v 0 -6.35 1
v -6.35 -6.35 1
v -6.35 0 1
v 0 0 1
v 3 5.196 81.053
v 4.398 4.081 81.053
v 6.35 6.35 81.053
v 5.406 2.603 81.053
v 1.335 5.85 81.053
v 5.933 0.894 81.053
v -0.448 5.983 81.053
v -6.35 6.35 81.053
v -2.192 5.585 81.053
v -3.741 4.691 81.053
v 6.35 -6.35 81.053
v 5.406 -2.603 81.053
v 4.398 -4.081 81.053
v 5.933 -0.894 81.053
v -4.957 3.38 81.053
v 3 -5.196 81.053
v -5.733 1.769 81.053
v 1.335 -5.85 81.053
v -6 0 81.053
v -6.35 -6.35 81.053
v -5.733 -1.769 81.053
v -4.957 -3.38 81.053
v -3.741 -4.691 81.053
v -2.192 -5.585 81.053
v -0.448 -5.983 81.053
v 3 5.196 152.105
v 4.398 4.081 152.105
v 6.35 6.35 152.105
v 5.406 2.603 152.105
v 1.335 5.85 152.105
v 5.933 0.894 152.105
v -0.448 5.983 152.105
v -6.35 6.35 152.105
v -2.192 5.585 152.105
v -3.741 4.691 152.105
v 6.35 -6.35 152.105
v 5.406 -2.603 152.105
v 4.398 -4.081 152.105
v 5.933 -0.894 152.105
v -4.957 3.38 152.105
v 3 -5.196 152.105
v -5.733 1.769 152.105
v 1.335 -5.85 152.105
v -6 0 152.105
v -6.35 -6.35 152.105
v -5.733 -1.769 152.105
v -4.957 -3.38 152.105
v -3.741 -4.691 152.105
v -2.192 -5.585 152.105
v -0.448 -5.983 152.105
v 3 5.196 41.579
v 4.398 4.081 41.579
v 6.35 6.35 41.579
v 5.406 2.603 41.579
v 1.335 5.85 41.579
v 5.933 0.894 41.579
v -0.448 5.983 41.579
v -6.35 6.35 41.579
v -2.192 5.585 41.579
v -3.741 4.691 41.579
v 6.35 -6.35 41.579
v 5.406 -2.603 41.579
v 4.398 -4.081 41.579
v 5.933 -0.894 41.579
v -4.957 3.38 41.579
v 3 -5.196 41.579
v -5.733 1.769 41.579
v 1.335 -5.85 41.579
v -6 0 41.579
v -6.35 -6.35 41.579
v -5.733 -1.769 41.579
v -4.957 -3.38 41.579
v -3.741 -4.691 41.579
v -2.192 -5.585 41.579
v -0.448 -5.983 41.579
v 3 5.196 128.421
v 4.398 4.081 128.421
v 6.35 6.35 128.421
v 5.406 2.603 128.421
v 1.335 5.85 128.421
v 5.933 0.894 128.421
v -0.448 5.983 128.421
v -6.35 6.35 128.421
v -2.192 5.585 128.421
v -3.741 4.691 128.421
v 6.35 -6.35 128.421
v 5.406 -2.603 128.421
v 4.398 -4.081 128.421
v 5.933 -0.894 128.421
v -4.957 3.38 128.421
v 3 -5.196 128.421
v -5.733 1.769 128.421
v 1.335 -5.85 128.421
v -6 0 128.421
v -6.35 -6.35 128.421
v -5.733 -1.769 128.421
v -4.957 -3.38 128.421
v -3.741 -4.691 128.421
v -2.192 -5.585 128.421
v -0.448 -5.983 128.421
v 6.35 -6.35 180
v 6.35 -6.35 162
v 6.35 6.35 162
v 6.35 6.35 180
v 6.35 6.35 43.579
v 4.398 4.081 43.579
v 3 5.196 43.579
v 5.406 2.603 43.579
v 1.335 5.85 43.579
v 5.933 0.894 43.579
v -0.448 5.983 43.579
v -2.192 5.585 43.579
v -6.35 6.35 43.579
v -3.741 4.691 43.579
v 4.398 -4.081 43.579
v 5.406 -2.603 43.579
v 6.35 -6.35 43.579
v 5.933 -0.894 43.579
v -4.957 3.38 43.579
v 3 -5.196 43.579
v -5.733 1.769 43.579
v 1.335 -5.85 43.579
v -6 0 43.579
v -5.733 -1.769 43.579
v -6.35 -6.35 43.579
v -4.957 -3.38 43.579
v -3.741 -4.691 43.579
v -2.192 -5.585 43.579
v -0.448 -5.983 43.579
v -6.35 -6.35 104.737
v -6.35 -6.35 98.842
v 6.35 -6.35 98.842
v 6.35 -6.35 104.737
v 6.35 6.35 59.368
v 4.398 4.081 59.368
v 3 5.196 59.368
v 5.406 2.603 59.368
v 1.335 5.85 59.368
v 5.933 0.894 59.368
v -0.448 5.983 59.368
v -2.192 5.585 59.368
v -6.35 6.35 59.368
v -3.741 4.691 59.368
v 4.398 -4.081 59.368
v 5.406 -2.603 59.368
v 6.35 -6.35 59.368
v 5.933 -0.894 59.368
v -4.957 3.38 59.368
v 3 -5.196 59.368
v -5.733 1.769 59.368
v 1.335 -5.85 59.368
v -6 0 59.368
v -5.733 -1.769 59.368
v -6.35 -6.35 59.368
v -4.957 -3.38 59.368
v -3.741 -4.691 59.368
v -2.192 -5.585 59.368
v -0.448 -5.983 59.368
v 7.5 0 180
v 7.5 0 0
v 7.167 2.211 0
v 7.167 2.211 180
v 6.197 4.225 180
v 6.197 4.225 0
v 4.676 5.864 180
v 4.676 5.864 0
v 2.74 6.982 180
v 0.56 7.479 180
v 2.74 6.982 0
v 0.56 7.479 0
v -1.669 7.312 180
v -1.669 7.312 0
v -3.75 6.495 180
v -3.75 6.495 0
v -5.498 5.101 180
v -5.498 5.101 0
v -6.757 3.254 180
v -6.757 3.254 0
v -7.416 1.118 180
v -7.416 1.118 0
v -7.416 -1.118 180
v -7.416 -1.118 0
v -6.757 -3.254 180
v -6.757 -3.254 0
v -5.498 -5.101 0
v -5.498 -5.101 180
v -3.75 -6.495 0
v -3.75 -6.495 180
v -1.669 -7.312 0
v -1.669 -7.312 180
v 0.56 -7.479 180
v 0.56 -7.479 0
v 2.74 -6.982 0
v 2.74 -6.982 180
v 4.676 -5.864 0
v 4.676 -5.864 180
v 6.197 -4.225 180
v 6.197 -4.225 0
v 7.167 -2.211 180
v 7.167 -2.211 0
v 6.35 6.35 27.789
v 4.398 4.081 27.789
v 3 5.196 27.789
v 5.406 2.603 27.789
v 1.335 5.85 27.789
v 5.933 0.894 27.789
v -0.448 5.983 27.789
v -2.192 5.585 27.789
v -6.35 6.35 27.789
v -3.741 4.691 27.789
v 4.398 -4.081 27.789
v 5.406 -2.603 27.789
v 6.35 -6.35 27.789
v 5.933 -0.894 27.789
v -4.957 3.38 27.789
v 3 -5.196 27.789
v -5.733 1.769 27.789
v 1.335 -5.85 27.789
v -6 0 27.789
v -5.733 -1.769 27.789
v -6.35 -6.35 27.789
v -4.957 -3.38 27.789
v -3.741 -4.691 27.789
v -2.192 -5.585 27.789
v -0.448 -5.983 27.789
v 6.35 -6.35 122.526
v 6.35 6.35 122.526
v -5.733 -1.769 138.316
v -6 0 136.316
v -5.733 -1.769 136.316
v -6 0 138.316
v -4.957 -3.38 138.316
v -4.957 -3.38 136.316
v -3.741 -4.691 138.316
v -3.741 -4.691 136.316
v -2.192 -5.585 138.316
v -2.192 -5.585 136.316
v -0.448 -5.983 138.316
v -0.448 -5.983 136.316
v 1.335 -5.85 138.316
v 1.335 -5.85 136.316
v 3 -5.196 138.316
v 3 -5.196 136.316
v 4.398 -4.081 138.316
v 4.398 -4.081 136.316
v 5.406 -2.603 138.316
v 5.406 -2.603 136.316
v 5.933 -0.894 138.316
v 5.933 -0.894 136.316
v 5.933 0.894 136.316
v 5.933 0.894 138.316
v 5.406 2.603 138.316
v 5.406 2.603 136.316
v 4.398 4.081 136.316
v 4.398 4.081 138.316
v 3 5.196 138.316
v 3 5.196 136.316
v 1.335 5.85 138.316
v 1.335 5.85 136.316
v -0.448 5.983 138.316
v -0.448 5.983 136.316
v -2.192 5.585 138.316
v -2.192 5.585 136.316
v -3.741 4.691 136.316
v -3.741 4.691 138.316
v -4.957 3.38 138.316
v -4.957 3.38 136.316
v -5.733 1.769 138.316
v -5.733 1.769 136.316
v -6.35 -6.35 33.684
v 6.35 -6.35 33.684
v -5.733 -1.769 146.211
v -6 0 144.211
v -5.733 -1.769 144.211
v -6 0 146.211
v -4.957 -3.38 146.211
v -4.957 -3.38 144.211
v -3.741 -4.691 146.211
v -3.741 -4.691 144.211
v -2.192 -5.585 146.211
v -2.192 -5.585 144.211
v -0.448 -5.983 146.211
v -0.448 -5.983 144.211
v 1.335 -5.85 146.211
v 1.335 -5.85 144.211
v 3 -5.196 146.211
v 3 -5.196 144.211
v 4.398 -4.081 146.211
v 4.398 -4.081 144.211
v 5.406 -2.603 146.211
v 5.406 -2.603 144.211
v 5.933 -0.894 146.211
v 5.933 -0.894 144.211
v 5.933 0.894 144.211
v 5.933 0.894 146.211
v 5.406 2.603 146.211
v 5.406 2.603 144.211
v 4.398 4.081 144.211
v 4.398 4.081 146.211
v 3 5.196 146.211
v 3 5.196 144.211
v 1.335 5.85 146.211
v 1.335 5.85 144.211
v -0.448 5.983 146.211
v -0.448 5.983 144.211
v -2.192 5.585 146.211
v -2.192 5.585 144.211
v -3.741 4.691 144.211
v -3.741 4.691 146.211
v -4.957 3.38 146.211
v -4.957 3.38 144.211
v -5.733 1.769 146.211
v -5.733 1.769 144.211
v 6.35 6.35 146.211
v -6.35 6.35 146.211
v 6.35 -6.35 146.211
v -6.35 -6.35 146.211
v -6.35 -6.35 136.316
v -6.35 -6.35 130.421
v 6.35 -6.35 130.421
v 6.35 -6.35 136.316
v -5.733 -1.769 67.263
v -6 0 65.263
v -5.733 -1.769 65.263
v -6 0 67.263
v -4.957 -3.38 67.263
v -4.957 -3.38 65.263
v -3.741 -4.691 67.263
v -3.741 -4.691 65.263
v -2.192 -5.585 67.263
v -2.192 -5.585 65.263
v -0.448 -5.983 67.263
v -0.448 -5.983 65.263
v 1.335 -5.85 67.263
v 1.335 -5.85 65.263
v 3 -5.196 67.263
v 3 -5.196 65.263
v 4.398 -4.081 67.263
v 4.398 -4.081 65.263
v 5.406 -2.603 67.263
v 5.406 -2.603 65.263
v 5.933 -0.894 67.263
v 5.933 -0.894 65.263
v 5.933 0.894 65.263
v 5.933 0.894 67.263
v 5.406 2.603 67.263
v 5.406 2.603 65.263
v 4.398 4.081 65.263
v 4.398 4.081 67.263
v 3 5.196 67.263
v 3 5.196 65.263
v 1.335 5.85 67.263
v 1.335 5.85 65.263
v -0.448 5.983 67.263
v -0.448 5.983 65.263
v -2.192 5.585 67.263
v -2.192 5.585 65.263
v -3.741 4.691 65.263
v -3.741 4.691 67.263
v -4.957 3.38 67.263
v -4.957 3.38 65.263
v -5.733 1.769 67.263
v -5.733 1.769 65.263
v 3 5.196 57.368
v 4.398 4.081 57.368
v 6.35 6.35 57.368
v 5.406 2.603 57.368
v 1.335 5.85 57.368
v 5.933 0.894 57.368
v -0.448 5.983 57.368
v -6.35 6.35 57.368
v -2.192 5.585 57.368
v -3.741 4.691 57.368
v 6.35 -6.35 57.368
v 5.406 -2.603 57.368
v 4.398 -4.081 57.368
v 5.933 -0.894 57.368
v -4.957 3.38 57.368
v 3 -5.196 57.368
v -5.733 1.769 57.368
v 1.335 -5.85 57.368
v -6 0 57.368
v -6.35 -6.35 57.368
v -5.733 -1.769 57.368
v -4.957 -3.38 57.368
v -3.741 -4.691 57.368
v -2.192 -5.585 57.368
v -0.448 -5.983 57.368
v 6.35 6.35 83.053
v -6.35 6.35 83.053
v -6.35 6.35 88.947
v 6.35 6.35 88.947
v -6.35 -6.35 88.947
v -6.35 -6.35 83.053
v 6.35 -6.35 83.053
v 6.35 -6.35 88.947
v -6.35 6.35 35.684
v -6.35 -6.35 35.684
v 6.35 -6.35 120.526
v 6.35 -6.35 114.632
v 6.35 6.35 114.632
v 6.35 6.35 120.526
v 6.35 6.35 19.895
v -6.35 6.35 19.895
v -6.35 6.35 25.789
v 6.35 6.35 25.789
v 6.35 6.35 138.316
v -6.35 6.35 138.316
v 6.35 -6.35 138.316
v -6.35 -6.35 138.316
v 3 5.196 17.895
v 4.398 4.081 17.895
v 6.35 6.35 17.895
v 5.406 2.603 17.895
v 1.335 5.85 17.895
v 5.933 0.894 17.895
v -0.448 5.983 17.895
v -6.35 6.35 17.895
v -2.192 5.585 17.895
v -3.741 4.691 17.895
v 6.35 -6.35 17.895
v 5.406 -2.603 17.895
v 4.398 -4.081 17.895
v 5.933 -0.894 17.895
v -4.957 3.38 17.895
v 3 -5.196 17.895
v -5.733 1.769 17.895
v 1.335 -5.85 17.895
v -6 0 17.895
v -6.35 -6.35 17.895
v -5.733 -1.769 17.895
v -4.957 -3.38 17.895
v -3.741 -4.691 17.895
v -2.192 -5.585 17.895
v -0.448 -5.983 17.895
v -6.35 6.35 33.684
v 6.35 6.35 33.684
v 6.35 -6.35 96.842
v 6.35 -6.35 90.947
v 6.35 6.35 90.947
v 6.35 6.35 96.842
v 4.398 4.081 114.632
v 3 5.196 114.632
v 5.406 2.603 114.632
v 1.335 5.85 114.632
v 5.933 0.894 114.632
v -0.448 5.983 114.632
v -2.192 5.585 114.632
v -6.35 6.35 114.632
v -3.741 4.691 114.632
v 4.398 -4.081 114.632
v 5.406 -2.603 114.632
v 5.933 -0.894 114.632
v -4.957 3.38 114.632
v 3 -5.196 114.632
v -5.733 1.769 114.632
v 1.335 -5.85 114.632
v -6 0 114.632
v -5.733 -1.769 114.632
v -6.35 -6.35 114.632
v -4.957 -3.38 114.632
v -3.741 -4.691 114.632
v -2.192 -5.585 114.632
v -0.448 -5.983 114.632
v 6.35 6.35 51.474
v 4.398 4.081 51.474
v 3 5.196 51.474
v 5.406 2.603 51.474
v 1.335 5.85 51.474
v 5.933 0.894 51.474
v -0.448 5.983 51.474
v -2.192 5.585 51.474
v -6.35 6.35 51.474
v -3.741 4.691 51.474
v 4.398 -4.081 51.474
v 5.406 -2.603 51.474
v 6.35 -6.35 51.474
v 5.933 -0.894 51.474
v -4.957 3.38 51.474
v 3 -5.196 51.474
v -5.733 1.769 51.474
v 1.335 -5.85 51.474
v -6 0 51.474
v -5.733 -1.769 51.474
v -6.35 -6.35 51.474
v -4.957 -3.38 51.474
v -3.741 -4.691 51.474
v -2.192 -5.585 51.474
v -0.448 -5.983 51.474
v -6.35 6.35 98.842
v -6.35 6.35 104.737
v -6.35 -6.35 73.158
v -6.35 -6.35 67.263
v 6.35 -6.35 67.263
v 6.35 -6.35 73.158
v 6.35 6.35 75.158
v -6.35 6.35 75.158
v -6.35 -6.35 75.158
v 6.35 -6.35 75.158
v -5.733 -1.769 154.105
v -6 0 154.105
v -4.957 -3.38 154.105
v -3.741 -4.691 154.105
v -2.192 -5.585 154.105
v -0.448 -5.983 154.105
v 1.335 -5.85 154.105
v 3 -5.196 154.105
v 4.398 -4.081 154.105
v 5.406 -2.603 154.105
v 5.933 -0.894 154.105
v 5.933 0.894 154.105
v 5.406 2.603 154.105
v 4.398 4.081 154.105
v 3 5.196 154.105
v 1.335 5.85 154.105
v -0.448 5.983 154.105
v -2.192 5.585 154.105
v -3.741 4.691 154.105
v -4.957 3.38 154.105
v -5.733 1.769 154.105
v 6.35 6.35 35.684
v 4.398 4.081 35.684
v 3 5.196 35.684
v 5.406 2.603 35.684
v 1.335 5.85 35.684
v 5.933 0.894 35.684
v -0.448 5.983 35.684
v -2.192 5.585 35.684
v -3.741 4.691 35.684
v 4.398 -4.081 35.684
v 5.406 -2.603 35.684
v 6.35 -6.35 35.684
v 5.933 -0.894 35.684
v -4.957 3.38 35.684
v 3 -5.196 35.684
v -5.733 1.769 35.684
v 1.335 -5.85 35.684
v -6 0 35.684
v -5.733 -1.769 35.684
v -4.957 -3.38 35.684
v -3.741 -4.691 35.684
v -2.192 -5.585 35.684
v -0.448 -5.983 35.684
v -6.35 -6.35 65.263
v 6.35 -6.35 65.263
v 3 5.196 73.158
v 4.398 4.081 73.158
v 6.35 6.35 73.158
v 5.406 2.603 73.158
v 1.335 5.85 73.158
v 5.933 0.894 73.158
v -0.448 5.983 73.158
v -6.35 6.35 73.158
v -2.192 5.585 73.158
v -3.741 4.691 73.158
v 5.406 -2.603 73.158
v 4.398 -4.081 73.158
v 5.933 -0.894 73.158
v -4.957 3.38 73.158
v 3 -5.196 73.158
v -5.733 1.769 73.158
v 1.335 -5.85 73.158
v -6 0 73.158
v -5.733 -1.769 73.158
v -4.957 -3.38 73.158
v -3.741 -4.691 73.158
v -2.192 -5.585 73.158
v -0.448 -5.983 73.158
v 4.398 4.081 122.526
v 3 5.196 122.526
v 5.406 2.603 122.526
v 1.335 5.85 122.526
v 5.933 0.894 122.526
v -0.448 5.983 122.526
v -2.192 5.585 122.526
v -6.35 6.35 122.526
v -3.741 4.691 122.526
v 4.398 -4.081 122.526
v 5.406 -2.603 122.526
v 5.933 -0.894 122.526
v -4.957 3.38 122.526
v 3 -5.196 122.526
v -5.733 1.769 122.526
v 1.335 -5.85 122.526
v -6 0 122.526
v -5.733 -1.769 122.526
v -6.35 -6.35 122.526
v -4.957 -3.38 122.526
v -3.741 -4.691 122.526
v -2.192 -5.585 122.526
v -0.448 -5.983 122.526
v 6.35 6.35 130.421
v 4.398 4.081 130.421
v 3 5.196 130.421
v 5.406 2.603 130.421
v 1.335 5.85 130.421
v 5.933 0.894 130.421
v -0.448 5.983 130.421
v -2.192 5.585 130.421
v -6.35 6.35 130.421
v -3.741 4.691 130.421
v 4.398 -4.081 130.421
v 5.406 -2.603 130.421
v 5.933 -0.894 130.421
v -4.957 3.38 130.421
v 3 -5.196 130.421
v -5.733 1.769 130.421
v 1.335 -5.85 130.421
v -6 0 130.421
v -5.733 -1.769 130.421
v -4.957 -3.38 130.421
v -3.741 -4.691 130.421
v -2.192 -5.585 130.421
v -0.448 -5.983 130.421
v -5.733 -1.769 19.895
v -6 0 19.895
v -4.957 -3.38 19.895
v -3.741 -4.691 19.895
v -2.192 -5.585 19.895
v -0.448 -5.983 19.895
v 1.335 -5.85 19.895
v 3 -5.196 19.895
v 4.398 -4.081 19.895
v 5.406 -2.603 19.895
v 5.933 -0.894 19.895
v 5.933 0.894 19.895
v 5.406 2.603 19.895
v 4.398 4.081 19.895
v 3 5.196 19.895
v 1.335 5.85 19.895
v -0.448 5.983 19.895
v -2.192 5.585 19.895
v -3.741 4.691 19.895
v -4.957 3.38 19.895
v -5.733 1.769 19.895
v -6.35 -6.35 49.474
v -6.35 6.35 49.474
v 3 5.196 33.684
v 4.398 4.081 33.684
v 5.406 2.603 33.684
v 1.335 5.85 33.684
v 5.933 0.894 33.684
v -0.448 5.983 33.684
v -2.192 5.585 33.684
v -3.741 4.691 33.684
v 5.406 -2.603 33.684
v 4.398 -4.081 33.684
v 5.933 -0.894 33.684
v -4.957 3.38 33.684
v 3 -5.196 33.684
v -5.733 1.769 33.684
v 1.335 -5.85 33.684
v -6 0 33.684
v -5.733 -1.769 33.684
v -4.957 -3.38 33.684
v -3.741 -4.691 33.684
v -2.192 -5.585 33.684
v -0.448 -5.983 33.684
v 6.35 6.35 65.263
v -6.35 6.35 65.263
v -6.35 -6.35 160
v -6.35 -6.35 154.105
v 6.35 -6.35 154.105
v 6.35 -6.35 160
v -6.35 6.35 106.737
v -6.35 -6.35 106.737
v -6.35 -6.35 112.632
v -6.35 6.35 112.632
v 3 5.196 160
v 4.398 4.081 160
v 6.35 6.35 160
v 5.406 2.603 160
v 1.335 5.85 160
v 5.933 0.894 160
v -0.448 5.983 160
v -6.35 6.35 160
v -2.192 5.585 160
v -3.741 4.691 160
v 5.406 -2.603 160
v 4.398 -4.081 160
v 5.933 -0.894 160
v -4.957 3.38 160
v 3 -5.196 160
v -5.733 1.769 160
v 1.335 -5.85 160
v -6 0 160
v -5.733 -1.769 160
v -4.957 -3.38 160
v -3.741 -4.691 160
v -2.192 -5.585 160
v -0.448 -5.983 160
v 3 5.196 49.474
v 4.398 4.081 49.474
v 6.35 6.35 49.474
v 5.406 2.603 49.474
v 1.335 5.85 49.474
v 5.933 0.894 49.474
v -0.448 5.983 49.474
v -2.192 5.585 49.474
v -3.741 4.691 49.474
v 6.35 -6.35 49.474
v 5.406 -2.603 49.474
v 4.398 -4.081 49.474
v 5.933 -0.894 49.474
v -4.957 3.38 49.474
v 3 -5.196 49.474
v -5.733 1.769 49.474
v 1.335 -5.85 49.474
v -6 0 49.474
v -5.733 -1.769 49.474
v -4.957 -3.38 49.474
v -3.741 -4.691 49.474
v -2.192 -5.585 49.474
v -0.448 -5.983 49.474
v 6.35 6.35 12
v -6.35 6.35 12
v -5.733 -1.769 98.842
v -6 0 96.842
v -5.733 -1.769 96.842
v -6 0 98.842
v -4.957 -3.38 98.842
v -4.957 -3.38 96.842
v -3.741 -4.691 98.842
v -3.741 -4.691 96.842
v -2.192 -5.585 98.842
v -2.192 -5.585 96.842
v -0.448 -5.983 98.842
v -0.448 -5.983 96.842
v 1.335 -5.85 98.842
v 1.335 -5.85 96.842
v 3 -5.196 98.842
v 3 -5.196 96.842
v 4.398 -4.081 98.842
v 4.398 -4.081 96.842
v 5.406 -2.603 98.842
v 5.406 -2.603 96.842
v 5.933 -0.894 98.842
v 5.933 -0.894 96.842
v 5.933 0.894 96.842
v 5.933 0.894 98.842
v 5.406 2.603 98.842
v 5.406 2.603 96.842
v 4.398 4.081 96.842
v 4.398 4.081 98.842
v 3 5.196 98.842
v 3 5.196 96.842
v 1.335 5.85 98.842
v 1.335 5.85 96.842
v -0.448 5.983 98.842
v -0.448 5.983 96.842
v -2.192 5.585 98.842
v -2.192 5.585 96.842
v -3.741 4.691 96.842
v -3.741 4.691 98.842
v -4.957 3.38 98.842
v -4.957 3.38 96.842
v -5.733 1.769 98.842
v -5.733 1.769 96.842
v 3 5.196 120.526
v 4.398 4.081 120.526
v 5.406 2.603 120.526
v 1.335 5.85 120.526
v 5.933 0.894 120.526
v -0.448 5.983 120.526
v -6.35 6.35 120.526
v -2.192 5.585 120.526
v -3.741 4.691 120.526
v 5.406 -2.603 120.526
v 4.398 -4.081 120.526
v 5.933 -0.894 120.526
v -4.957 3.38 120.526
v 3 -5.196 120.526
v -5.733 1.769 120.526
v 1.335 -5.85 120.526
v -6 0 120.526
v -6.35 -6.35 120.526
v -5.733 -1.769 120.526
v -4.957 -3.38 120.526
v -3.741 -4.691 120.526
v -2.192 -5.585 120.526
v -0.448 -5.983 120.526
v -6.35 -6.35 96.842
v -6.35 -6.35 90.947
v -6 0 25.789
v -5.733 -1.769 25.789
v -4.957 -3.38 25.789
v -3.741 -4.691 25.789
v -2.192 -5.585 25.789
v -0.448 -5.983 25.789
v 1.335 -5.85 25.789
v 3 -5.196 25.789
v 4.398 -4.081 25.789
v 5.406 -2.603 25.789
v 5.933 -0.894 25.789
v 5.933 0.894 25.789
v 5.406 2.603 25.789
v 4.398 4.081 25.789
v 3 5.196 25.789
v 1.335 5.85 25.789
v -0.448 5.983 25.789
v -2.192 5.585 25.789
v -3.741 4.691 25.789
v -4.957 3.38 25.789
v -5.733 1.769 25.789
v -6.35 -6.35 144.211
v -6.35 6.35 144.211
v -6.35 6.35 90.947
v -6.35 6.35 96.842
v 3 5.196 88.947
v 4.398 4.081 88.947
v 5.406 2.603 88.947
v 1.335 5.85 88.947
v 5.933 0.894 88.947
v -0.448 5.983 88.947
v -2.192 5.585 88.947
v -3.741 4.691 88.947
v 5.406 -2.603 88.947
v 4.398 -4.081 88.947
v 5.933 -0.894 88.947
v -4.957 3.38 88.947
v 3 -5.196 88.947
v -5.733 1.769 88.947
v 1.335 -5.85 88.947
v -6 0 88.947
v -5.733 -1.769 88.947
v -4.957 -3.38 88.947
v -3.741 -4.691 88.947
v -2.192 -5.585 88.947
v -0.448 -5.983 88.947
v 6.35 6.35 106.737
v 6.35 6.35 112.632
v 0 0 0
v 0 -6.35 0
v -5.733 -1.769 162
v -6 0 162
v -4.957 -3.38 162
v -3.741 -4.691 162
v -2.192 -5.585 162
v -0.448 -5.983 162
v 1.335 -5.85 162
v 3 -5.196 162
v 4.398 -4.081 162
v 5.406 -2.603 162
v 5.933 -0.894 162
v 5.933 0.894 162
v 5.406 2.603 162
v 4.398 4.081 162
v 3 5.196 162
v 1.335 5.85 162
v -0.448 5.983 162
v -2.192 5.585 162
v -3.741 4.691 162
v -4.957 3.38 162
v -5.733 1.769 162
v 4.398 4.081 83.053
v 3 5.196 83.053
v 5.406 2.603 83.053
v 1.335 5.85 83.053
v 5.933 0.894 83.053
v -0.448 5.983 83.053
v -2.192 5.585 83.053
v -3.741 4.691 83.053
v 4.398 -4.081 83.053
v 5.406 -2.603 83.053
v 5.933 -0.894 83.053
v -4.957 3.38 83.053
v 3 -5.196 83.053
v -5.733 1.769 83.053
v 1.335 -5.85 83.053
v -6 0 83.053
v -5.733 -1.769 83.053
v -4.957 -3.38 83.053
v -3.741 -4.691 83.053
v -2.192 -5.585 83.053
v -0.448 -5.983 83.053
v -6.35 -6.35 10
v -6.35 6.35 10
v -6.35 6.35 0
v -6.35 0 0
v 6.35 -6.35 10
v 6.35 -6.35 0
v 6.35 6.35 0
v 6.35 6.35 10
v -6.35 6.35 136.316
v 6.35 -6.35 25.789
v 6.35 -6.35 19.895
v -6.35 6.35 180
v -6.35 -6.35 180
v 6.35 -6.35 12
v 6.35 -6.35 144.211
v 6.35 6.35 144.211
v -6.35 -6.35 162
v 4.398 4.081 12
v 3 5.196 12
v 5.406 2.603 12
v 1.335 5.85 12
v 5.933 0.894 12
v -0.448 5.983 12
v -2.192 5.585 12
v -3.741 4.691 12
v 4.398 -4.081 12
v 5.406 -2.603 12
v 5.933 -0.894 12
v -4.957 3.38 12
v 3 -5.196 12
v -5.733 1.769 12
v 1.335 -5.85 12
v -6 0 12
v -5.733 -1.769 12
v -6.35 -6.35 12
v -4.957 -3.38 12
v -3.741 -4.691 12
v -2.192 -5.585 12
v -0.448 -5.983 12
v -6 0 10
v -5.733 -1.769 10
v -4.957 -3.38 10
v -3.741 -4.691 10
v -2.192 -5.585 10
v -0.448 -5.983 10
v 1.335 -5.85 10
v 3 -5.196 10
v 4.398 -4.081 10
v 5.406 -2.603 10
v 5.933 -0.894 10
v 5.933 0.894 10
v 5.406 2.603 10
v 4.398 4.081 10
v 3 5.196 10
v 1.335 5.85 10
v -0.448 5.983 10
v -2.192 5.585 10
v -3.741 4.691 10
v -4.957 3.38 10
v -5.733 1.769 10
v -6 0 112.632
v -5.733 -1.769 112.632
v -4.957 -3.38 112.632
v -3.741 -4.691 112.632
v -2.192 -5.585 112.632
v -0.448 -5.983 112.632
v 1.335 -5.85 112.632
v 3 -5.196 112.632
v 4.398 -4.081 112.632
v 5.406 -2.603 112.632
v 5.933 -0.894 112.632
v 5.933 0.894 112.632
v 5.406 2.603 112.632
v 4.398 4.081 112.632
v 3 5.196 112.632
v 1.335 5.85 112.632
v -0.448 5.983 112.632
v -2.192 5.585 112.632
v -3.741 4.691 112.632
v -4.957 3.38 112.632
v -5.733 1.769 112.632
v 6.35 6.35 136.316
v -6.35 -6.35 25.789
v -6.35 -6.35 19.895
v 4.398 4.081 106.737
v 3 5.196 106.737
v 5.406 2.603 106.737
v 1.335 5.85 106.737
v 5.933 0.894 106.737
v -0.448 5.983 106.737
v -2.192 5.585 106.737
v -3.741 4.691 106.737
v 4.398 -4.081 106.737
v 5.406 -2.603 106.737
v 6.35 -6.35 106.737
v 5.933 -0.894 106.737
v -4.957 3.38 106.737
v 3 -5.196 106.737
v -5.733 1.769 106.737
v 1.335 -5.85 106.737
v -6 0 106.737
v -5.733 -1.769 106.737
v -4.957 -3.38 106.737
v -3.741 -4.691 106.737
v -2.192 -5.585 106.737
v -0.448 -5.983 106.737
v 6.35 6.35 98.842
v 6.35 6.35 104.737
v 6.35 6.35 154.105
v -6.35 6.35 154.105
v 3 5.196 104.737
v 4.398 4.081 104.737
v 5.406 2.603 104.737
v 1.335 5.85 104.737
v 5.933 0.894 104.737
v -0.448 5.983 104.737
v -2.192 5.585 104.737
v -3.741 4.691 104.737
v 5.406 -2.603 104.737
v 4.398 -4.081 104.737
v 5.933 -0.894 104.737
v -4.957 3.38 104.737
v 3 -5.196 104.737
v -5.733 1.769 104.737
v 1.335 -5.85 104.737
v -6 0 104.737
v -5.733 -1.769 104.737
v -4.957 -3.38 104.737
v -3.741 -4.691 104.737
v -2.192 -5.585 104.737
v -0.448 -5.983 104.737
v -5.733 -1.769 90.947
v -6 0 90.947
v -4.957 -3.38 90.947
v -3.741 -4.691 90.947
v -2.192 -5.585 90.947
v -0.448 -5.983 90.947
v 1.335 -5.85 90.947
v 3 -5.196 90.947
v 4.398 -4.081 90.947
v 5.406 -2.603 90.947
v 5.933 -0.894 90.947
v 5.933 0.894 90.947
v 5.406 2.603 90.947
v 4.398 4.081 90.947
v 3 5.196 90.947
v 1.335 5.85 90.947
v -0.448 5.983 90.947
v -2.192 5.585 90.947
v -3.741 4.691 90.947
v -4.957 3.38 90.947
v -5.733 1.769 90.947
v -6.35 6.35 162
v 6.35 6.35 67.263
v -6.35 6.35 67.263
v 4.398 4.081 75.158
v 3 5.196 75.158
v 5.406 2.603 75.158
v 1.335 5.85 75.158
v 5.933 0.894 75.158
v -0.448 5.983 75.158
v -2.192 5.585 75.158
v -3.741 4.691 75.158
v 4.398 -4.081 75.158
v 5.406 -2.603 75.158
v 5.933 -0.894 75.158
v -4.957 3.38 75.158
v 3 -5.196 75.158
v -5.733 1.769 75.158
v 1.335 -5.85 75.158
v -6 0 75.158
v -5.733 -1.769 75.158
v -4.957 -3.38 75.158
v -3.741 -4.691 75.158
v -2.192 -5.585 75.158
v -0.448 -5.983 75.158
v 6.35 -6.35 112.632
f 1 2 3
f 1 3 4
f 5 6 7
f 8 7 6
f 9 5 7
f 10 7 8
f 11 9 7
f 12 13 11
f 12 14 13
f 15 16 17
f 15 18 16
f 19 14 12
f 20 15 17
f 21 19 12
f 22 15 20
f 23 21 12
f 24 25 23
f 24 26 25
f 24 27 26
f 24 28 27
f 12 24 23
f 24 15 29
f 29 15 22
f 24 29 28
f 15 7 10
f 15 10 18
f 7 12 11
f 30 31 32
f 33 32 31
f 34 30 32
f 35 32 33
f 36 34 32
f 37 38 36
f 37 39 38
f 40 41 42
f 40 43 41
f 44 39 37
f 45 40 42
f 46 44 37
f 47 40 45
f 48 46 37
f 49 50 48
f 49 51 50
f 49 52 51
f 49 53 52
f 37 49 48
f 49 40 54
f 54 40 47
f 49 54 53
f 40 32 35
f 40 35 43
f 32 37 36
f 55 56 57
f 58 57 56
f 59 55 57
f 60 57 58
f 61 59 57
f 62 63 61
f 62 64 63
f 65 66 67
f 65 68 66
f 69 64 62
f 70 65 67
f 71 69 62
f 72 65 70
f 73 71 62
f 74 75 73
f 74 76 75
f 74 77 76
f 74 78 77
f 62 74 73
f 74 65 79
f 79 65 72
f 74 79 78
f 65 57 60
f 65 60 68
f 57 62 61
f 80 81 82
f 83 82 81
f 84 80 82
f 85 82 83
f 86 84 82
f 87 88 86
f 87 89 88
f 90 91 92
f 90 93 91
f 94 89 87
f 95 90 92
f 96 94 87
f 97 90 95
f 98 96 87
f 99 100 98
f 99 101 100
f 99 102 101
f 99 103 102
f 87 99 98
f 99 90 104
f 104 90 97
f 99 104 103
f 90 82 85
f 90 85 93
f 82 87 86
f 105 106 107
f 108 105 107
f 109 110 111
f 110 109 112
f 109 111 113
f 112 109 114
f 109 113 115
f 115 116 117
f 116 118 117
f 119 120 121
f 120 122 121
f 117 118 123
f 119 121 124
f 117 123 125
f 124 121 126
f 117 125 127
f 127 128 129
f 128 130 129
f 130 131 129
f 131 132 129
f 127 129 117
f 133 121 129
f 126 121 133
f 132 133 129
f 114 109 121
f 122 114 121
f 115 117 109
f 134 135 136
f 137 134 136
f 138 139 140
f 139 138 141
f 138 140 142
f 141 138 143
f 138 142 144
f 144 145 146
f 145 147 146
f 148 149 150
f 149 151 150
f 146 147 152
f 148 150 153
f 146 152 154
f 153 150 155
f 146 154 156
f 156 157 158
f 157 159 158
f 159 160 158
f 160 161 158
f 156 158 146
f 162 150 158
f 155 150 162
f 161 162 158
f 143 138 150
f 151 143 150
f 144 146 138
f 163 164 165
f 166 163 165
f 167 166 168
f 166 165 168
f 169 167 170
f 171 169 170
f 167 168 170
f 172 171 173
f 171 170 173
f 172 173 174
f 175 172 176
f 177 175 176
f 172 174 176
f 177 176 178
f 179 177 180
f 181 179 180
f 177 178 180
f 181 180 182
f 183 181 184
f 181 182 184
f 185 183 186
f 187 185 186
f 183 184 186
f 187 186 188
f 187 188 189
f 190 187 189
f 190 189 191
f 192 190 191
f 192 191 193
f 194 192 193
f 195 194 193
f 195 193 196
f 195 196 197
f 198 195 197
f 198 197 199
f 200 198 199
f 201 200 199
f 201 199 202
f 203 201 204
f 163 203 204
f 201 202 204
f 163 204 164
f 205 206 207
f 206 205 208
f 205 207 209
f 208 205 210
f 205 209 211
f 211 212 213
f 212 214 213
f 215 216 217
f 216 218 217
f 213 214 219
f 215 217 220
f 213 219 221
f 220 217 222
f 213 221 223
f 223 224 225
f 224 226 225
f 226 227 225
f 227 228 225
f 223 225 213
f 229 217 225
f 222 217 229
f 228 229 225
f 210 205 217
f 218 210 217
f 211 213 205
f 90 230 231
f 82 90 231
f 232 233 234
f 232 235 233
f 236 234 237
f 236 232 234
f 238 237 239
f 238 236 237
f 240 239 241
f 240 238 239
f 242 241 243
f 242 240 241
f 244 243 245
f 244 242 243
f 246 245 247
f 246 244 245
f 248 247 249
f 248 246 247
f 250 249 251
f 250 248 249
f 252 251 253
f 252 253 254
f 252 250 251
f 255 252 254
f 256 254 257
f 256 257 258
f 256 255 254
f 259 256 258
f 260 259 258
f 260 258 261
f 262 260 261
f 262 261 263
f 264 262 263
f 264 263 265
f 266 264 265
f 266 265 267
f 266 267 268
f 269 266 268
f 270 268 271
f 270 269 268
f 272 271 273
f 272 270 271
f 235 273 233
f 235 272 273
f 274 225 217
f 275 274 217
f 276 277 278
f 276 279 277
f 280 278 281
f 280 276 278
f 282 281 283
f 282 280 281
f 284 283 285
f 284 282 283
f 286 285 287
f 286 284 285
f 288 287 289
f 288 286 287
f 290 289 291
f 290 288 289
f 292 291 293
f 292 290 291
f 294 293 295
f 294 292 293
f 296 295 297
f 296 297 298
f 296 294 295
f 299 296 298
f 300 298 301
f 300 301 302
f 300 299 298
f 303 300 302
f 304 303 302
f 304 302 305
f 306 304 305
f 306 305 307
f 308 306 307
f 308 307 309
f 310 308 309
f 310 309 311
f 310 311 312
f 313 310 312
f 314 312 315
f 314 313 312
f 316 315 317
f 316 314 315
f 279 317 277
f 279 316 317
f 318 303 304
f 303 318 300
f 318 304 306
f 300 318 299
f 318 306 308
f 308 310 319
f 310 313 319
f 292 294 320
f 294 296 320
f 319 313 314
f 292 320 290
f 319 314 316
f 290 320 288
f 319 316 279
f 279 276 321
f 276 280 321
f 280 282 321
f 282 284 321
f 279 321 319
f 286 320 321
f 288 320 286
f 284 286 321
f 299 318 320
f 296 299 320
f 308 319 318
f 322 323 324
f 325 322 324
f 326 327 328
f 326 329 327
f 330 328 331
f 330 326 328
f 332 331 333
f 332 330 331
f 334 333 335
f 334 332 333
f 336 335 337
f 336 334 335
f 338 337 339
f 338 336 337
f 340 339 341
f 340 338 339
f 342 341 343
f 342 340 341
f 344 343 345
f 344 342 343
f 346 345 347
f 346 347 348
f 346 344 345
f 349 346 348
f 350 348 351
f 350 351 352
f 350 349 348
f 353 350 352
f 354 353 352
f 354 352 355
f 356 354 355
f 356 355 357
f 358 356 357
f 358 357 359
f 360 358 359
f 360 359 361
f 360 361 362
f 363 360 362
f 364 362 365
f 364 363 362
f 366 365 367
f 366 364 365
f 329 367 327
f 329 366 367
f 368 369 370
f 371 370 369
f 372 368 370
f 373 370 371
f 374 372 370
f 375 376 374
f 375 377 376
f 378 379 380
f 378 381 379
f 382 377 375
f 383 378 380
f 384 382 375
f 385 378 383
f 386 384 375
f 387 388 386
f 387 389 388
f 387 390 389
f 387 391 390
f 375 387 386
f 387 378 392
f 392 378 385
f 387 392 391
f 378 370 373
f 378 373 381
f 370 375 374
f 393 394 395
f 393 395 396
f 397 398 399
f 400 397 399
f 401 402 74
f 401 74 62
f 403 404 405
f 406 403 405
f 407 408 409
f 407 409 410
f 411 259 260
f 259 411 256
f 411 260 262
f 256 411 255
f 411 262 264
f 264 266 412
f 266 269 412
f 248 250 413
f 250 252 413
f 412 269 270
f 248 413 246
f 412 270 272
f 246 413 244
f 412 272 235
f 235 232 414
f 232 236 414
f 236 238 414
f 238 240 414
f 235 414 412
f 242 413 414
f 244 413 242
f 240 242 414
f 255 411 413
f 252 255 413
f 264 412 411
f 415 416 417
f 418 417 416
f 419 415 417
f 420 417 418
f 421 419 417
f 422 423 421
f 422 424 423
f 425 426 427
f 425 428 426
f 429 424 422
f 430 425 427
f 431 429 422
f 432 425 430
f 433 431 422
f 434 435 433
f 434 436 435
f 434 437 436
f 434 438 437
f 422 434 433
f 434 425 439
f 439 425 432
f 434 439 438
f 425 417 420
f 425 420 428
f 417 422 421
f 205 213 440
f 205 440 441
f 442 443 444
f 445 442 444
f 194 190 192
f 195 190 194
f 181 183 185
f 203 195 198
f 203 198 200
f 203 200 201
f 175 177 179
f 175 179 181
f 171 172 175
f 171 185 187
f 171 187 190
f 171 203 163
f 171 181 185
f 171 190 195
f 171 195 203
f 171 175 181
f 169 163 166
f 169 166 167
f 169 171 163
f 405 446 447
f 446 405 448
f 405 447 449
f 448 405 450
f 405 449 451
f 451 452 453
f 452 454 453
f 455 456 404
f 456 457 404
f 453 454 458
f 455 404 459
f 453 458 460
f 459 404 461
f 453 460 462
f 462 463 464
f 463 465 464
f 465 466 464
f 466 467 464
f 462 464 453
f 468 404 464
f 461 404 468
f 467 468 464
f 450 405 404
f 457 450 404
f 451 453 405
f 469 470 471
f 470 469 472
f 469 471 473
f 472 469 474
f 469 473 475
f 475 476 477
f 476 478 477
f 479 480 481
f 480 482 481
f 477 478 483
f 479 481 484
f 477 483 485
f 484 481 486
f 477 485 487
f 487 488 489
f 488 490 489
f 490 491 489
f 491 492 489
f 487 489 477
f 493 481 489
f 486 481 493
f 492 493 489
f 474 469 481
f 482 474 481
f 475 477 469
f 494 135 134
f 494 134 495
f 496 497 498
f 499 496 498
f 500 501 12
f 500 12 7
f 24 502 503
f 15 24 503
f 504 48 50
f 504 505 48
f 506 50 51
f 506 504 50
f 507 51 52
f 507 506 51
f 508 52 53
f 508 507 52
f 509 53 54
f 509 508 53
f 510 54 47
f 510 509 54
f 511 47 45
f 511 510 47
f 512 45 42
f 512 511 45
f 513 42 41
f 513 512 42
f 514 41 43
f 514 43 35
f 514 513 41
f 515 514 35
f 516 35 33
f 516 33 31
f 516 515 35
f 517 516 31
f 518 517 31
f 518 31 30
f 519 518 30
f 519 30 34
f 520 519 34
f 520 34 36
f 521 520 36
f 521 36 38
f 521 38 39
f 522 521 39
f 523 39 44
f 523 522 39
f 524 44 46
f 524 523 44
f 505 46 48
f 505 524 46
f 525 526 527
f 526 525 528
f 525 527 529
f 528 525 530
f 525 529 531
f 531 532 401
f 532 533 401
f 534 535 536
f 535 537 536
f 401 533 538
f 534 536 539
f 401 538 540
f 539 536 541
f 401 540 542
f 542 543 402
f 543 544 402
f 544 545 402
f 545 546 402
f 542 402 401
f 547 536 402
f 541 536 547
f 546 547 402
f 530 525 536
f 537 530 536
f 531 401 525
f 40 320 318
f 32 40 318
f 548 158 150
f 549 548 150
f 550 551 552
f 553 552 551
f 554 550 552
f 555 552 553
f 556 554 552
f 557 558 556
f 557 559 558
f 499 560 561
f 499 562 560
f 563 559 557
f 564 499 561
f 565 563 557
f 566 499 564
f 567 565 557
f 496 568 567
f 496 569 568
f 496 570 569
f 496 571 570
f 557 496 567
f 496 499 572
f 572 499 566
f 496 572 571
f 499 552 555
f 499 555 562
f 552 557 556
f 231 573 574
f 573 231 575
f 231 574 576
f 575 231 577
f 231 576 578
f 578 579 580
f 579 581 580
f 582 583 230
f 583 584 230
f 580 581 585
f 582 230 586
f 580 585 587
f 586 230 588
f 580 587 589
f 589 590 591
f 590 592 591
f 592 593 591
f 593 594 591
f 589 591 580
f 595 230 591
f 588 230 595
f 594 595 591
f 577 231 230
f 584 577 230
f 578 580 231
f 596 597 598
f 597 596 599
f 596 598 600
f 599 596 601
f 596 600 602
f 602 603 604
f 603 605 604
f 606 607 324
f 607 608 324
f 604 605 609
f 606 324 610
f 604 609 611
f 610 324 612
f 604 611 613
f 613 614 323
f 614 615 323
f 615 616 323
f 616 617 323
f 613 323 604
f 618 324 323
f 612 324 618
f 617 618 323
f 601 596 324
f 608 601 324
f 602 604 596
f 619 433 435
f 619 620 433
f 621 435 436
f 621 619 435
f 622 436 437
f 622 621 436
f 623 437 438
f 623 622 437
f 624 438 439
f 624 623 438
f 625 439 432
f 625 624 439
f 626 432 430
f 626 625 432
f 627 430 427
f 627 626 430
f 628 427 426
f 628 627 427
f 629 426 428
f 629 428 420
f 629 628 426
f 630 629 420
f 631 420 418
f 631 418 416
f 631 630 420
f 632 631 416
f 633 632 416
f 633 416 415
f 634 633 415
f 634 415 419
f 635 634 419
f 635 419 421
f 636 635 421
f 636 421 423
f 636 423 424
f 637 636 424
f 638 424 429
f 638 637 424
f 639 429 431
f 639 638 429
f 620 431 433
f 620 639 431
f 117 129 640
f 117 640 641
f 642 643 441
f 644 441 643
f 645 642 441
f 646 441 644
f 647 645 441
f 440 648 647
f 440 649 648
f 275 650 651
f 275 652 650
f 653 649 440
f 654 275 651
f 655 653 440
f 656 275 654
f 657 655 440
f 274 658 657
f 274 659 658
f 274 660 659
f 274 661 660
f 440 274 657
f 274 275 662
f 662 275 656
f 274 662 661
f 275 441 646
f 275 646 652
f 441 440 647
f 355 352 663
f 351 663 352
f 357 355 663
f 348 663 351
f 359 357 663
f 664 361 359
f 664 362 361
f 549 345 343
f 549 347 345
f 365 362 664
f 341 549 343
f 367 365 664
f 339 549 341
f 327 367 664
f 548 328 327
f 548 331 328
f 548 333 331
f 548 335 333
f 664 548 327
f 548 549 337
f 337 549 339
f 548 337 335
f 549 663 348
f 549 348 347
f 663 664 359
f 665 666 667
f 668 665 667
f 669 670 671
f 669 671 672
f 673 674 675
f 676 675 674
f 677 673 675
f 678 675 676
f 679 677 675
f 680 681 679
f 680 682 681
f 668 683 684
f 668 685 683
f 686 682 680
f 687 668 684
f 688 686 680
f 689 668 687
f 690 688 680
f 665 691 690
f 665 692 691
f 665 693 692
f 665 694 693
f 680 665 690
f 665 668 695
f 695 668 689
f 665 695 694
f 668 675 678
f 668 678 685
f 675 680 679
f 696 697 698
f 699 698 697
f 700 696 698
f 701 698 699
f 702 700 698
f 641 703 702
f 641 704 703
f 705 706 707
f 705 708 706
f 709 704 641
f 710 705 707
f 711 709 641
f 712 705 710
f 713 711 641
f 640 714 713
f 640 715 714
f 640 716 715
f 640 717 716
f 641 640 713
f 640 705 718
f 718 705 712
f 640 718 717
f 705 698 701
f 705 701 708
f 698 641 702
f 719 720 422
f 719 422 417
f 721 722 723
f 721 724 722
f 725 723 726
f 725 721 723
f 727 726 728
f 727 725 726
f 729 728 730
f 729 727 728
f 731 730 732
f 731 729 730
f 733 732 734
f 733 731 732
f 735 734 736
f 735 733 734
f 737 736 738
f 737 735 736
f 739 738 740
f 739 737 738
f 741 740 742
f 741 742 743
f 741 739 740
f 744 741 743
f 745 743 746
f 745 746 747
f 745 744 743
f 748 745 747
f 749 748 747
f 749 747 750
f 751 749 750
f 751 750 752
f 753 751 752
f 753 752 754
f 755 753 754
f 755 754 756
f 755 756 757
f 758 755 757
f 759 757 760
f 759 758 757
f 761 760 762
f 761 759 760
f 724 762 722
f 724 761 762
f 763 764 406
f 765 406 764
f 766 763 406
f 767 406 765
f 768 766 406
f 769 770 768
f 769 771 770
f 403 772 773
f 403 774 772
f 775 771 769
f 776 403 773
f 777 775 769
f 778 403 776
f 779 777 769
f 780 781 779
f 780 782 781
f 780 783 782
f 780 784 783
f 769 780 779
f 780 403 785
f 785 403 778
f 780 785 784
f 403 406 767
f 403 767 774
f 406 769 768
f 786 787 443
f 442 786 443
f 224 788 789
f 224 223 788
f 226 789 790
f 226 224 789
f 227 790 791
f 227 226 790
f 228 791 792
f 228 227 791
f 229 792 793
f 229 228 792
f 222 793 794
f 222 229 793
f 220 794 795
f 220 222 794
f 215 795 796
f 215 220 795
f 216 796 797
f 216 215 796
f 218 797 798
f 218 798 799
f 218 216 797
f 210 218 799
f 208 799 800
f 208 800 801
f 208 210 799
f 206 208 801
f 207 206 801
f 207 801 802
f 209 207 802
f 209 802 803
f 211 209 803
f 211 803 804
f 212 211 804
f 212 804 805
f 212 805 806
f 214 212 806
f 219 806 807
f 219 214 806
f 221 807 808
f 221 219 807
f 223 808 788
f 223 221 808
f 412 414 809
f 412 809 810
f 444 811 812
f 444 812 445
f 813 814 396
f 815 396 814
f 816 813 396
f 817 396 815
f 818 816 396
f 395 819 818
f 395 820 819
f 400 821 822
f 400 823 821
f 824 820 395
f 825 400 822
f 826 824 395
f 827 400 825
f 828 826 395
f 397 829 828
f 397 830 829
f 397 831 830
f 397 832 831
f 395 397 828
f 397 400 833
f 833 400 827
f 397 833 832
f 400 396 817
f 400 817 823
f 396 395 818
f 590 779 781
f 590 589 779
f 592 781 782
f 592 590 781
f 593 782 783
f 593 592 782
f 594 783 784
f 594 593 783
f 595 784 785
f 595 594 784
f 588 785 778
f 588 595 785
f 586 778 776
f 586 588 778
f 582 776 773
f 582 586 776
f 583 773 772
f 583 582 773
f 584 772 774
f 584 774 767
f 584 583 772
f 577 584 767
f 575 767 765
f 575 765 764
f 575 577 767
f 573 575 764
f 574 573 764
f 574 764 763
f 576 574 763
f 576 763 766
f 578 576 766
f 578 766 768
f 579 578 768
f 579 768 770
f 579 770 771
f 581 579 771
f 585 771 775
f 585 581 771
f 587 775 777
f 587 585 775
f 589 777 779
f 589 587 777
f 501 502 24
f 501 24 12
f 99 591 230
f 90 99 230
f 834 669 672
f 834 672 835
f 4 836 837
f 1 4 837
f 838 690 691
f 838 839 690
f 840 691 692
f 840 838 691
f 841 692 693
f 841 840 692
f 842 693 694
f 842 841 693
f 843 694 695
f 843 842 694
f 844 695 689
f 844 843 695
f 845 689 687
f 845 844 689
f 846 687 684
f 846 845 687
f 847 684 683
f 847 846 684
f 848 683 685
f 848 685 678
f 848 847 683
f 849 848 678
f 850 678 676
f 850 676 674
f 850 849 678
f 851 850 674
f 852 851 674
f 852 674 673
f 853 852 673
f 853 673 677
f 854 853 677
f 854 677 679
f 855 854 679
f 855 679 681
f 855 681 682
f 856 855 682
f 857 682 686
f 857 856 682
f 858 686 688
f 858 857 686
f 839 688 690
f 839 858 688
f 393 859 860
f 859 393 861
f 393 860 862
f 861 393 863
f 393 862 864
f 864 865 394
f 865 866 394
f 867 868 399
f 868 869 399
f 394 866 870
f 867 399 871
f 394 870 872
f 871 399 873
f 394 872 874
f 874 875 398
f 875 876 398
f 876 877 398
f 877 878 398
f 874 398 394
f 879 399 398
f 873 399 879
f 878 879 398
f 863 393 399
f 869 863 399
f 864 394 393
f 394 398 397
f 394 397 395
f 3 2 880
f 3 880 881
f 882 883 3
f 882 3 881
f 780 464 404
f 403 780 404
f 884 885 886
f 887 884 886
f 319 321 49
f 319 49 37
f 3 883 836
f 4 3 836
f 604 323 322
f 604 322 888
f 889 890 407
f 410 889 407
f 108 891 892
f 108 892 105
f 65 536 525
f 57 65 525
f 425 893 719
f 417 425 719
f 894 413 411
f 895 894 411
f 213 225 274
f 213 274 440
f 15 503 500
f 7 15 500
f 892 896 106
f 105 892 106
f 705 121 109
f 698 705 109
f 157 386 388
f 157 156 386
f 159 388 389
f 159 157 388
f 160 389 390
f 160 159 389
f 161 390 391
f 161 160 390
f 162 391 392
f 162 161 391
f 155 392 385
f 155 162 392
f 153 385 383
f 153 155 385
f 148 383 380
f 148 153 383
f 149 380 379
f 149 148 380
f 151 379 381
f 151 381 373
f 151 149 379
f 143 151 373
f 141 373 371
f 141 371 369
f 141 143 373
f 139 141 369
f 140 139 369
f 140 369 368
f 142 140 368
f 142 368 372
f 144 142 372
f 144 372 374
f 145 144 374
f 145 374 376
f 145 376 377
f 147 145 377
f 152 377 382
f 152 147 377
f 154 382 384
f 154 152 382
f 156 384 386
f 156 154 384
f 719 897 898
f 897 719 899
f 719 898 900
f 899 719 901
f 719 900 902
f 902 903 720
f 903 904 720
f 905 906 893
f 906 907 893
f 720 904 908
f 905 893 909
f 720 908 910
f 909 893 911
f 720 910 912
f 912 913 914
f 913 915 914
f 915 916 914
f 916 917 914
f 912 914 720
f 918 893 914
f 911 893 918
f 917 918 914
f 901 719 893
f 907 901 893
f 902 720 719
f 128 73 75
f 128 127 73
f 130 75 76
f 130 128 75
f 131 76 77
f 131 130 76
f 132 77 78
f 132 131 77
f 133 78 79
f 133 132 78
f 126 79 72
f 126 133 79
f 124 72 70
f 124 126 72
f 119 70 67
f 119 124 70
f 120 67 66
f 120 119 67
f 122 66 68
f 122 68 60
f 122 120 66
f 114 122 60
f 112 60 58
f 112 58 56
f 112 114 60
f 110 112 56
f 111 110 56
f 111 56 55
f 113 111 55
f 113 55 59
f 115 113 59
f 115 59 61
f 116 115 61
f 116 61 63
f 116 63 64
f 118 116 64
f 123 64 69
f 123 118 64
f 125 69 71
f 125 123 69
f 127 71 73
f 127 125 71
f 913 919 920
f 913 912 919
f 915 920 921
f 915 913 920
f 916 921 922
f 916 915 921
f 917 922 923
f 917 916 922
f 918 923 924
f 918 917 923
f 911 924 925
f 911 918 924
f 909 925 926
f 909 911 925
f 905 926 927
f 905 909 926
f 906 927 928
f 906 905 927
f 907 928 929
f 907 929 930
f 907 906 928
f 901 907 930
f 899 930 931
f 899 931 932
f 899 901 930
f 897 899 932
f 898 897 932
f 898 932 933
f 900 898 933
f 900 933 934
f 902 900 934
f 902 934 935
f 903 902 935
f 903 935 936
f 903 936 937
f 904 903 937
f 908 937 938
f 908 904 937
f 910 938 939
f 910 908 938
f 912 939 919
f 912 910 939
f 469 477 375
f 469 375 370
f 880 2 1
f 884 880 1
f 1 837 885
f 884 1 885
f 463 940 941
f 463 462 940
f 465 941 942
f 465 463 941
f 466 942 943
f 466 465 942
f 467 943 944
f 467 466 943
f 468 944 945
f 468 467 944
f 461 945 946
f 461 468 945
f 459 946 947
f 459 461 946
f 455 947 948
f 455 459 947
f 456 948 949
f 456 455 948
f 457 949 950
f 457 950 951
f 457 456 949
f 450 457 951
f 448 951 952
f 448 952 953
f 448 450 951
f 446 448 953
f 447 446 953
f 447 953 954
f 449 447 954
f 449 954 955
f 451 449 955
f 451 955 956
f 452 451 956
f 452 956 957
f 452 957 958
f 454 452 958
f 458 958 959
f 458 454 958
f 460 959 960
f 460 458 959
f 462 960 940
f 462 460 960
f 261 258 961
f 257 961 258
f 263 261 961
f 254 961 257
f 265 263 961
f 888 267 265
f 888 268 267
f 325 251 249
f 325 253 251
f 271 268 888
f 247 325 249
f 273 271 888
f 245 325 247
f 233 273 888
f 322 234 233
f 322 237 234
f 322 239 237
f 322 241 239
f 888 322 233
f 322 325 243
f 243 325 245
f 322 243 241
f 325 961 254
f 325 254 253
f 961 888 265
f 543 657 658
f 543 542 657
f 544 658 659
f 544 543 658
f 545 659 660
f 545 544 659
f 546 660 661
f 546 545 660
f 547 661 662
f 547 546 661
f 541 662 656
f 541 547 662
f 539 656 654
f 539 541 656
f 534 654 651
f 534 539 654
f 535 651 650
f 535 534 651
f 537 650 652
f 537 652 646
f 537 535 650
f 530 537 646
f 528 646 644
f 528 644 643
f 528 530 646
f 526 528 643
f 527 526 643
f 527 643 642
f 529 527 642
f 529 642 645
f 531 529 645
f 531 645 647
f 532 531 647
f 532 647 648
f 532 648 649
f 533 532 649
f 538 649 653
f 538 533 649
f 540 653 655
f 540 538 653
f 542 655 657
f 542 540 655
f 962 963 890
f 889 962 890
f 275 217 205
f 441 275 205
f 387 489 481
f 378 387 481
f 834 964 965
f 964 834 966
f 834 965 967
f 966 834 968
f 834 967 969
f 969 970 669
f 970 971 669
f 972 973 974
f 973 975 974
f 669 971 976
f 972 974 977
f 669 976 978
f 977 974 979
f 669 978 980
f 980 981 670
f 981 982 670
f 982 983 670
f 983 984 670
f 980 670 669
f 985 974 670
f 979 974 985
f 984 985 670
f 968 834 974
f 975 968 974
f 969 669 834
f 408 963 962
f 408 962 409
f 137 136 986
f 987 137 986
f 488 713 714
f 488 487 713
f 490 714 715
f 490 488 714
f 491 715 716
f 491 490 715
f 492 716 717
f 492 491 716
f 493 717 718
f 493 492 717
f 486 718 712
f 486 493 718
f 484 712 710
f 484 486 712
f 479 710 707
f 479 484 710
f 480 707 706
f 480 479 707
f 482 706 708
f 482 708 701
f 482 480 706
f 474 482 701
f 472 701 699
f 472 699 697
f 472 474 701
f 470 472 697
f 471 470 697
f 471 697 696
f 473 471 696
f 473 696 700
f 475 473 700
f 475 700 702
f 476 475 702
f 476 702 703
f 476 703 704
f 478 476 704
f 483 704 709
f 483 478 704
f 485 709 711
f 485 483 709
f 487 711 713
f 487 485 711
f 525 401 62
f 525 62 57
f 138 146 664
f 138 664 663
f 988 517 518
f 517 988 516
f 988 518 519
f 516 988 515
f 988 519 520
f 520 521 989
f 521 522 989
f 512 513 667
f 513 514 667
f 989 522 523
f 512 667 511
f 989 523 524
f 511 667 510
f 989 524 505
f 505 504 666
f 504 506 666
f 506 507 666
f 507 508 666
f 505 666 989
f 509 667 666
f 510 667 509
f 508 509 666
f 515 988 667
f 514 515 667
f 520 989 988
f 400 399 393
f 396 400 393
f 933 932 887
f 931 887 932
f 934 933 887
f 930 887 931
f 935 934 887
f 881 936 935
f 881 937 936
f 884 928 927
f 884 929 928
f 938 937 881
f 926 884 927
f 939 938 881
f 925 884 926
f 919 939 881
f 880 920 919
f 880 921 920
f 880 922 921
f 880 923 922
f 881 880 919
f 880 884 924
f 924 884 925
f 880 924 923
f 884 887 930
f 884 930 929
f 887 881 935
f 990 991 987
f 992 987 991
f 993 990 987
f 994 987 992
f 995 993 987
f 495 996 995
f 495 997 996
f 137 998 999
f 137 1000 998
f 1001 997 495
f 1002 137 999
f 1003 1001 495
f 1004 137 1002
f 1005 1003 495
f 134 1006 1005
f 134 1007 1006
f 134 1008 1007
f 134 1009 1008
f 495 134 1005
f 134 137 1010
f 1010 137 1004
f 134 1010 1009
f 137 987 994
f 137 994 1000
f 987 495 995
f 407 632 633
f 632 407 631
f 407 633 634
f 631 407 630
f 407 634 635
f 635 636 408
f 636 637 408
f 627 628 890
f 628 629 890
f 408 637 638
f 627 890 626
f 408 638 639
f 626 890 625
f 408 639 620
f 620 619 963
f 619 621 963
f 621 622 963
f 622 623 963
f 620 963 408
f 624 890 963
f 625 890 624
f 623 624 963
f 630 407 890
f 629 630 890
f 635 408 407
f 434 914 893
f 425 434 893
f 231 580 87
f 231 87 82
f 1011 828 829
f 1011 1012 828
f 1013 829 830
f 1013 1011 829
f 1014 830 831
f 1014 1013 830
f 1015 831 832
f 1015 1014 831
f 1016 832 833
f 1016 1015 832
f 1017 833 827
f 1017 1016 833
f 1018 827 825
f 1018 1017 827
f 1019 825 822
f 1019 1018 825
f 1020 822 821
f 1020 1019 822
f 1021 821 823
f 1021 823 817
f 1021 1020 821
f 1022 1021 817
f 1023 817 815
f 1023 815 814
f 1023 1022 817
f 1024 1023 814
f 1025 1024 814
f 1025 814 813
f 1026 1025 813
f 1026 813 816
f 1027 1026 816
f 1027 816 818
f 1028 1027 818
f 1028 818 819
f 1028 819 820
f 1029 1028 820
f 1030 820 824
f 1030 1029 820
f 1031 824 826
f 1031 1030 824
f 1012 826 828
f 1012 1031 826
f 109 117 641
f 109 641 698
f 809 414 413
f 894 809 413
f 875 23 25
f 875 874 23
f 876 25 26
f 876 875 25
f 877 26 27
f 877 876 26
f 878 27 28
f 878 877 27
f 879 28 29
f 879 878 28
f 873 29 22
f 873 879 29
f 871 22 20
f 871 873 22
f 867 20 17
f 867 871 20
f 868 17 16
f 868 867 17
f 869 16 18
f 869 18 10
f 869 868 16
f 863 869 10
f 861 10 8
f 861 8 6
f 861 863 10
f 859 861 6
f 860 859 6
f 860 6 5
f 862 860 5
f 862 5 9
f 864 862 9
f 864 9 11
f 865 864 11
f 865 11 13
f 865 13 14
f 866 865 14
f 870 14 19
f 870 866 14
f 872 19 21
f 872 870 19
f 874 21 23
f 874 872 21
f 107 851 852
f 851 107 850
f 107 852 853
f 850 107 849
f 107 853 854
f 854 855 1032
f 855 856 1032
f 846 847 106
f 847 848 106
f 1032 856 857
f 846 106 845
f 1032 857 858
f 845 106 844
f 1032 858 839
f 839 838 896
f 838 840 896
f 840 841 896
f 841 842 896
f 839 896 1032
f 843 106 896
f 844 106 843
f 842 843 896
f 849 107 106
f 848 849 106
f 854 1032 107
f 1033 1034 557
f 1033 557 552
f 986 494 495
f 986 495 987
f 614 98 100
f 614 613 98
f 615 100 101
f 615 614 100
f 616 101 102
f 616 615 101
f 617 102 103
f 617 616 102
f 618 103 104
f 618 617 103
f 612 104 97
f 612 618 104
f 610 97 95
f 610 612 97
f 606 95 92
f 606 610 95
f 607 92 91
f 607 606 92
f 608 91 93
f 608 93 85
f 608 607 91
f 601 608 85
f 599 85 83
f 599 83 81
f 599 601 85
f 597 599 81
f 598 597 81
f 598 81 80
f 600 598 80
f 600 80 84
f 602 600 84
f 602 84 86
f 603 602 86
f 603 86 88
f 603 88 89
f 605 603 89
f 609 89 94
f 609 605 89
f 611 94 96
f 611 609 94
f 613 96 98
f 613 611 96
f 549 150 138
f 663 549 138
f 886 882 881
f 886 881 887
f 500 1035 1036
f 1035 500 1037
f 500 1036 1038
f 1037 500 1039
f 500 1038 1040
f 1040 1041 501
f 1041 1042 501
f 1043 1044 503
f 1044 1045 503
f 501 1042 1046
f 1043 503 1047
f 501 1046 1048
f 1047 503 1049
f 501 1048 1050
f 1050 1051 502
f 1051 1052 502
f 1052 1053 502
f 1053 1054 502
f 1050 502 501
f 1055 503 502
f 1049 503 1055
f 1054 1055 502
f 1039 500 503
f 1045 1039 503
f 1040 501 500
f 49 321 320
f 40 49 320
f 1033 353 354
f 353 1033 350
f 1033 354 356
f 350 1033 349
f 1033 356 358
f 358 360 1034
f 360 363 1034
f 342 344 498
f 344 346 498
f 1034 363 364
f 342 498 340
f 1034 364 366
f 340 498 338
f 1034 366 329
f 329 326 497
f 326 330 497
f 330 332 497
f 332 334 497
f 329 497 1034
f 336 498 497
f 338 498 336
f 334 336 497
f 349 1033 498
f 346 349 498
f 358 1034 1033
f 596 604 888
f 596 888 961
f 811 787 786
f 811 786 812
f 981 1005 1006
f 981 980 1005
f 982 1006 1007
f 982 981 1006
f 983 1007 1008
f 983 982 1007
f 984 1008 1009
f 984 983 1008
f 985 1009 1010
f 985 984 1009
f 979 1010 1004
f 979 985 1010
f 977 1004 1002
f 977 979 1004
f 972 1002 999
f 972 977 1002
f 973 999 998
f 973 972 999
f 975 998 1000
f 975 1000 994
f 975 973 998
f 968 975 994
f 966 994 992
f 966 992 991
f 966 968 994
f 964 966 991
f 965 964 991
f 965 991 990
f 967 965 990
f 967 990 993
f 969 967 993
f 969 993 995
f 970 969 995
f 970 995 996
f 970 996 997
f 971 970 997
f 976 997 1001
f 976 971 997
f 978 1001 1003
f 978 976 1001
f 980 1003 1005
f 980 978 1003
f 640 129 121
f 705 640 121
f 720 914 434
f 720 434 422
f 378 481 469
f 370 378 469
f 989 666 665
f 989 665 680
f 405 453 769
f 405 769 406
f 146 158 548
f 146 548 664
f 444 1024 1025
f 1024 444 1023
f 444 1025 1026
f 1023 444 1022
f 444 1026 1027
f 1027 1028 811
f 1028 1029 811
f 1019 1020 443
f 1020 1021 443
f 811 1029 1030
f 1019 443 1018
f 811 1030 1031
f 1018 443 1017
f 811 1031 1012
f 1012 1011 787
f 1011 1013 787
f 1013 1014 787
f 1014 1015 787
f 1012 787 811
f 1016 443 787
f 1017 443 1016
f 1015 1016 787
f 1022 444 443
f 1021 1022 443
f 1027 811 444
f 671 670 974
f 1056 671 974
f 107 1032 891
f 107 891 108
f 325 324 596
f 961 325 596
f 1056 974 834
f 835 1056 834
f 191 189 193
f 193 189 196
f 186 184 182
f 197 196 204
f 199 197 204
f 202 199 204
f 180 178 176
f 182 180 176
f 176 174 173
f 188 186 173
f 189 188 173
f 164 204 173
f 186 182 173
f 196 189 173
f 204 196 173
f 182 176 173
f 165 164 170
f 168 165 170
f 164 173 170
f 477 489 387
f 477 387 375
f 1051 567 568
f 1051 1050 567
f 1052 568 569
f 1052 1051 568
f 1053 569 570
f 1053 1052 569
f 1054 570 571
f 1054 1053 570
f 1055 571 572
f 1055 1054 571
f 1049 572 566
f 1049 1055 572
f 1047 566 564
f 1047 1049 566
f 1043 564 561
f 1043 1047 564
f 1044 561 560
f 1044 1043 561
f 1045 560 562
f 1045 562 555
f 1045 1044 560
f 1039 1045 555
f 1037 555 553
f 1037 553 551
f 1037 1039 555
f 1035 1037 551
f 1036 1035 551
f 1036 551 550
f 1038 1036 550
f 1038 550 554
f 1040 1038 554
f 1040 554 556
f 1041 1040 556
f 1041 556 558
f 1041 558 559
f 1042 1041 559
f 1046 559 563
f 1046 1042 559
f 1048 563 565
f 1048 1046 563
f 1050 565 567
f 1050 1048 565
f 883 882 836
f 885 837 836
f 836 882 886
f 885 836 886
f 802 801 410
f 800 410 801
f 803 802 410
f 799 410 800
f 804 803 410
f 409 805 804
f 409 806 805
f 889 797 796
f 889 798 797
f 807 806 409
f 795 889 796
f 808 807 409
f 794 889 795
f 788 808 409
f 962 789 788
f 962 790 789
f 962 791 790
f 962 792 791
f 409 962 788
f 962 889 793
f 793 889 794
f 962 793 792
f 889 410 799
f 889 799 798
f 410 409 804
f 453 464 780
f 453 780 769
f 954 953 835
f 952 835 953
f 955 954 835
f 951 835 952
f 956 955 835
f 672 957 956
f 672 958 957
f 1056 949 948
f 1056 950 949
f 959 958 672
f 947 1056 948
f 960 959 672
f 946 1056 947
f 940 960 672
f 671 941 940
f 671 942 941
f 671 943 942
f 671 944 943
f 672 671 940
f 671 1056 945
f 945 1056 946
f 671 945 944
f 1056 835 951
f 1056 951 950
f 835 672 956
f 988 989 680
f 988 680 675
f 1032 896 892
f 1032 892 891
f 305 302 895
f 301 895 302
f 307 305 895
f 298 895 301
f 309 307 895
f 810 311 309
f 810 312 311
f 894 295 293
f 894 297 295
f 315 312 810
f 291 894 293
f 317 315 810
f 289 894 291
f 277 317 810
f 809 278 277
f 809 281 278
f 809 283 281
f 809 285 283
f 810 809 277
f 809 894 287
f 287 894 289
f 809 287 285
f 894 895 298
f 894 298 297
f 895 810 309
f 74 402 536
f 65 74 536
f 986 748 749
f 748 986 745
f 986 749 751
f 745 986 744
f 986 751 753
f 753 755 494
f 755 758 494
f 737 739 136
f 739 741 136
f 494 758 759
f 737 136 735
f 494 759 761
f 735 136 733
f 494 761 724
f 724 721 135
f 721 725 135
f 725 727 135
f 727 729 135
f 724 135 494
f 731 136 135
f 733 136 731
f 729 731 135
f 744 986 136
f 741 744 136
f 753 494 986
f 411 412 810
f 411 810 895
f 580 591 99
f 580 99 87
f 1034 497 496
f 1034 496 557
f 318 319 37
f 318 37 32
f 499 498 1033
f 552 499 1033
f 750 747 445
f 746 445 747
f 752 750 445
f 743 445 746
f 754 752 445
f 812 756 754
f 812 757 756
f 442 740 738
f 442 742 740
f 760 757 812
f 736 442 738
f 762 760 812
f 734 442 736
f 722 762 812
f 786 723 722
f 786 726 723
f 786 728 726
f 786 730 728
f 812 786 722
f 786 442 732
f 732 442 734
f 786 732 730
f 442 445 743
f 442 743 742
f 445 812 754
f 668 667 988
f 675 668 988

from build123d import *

# Parameters (mm, degrees)
SKETCH002_R         = 7.5
PAD001_DEPTH        = 180
SKETCH001_W         = 12.7
SKETCH001_H         = 12.7
PAD_DEPTH           = 180
SKETCH006_W         = 12
SKETCH006_H         = 12
POCKET_DEPTH        = 1
SKETCH005_W         = 20
SKETCH005_H         = 2
LINEARPATTERN_COUNT = 20
LINEARPATTERN_PITCH = 7.894737


with BuildPart() as pad001:
    # Sketch002 → Pad001 (new body)
    with BuildSketch(Plane.XY):
        Circle(SKETCH002_R)
    extrude(amount=PAD001_DEPTH)


with BuildPart() as linearpattern:
    # Sketch001 → Pad (new body)
    with BuildSketch(Plane.XY):
        Rectangle(SKETCH001_W, SKETCH001_H)
    extrude(amount=PAD_DEPTH)

    # Sketch006 → Pocket (cut)
    with BuildSketch(Plane(origin=(0, 0, 0), x_dir=(1, 0, 0), z_dir=(0, 0, -1))):
        with Locations((-6, 6)):
            Rectangle(SKETCH006_W, SKETCH006_H)
    extrude(amount=-POCKET_DEPTH, mode=Mode.SUBTRACT)

    # Sketch005 → Groove (revolve, cut)
    with BuildSketch(Plane.XZ):
        with Locations((-16, 11)):
            Rectangle(SKETCH005_W, SKETCH005_H)
    groove = revolve(axis=Axis((0, 0, 0), (0, 0, 1)), mode=Mode.SUBTRACT)

    # LinearPattern: Groove ×20
    with Locations(*[(0, 0, i * LINEARPATTERN_PITCH) for i in range(1, LINEARPATTERN_COUNT)]):
        add(groove, mode=Mode.SUBTRACT)


solid = Compound([pad001.part, linearpattern.part])
